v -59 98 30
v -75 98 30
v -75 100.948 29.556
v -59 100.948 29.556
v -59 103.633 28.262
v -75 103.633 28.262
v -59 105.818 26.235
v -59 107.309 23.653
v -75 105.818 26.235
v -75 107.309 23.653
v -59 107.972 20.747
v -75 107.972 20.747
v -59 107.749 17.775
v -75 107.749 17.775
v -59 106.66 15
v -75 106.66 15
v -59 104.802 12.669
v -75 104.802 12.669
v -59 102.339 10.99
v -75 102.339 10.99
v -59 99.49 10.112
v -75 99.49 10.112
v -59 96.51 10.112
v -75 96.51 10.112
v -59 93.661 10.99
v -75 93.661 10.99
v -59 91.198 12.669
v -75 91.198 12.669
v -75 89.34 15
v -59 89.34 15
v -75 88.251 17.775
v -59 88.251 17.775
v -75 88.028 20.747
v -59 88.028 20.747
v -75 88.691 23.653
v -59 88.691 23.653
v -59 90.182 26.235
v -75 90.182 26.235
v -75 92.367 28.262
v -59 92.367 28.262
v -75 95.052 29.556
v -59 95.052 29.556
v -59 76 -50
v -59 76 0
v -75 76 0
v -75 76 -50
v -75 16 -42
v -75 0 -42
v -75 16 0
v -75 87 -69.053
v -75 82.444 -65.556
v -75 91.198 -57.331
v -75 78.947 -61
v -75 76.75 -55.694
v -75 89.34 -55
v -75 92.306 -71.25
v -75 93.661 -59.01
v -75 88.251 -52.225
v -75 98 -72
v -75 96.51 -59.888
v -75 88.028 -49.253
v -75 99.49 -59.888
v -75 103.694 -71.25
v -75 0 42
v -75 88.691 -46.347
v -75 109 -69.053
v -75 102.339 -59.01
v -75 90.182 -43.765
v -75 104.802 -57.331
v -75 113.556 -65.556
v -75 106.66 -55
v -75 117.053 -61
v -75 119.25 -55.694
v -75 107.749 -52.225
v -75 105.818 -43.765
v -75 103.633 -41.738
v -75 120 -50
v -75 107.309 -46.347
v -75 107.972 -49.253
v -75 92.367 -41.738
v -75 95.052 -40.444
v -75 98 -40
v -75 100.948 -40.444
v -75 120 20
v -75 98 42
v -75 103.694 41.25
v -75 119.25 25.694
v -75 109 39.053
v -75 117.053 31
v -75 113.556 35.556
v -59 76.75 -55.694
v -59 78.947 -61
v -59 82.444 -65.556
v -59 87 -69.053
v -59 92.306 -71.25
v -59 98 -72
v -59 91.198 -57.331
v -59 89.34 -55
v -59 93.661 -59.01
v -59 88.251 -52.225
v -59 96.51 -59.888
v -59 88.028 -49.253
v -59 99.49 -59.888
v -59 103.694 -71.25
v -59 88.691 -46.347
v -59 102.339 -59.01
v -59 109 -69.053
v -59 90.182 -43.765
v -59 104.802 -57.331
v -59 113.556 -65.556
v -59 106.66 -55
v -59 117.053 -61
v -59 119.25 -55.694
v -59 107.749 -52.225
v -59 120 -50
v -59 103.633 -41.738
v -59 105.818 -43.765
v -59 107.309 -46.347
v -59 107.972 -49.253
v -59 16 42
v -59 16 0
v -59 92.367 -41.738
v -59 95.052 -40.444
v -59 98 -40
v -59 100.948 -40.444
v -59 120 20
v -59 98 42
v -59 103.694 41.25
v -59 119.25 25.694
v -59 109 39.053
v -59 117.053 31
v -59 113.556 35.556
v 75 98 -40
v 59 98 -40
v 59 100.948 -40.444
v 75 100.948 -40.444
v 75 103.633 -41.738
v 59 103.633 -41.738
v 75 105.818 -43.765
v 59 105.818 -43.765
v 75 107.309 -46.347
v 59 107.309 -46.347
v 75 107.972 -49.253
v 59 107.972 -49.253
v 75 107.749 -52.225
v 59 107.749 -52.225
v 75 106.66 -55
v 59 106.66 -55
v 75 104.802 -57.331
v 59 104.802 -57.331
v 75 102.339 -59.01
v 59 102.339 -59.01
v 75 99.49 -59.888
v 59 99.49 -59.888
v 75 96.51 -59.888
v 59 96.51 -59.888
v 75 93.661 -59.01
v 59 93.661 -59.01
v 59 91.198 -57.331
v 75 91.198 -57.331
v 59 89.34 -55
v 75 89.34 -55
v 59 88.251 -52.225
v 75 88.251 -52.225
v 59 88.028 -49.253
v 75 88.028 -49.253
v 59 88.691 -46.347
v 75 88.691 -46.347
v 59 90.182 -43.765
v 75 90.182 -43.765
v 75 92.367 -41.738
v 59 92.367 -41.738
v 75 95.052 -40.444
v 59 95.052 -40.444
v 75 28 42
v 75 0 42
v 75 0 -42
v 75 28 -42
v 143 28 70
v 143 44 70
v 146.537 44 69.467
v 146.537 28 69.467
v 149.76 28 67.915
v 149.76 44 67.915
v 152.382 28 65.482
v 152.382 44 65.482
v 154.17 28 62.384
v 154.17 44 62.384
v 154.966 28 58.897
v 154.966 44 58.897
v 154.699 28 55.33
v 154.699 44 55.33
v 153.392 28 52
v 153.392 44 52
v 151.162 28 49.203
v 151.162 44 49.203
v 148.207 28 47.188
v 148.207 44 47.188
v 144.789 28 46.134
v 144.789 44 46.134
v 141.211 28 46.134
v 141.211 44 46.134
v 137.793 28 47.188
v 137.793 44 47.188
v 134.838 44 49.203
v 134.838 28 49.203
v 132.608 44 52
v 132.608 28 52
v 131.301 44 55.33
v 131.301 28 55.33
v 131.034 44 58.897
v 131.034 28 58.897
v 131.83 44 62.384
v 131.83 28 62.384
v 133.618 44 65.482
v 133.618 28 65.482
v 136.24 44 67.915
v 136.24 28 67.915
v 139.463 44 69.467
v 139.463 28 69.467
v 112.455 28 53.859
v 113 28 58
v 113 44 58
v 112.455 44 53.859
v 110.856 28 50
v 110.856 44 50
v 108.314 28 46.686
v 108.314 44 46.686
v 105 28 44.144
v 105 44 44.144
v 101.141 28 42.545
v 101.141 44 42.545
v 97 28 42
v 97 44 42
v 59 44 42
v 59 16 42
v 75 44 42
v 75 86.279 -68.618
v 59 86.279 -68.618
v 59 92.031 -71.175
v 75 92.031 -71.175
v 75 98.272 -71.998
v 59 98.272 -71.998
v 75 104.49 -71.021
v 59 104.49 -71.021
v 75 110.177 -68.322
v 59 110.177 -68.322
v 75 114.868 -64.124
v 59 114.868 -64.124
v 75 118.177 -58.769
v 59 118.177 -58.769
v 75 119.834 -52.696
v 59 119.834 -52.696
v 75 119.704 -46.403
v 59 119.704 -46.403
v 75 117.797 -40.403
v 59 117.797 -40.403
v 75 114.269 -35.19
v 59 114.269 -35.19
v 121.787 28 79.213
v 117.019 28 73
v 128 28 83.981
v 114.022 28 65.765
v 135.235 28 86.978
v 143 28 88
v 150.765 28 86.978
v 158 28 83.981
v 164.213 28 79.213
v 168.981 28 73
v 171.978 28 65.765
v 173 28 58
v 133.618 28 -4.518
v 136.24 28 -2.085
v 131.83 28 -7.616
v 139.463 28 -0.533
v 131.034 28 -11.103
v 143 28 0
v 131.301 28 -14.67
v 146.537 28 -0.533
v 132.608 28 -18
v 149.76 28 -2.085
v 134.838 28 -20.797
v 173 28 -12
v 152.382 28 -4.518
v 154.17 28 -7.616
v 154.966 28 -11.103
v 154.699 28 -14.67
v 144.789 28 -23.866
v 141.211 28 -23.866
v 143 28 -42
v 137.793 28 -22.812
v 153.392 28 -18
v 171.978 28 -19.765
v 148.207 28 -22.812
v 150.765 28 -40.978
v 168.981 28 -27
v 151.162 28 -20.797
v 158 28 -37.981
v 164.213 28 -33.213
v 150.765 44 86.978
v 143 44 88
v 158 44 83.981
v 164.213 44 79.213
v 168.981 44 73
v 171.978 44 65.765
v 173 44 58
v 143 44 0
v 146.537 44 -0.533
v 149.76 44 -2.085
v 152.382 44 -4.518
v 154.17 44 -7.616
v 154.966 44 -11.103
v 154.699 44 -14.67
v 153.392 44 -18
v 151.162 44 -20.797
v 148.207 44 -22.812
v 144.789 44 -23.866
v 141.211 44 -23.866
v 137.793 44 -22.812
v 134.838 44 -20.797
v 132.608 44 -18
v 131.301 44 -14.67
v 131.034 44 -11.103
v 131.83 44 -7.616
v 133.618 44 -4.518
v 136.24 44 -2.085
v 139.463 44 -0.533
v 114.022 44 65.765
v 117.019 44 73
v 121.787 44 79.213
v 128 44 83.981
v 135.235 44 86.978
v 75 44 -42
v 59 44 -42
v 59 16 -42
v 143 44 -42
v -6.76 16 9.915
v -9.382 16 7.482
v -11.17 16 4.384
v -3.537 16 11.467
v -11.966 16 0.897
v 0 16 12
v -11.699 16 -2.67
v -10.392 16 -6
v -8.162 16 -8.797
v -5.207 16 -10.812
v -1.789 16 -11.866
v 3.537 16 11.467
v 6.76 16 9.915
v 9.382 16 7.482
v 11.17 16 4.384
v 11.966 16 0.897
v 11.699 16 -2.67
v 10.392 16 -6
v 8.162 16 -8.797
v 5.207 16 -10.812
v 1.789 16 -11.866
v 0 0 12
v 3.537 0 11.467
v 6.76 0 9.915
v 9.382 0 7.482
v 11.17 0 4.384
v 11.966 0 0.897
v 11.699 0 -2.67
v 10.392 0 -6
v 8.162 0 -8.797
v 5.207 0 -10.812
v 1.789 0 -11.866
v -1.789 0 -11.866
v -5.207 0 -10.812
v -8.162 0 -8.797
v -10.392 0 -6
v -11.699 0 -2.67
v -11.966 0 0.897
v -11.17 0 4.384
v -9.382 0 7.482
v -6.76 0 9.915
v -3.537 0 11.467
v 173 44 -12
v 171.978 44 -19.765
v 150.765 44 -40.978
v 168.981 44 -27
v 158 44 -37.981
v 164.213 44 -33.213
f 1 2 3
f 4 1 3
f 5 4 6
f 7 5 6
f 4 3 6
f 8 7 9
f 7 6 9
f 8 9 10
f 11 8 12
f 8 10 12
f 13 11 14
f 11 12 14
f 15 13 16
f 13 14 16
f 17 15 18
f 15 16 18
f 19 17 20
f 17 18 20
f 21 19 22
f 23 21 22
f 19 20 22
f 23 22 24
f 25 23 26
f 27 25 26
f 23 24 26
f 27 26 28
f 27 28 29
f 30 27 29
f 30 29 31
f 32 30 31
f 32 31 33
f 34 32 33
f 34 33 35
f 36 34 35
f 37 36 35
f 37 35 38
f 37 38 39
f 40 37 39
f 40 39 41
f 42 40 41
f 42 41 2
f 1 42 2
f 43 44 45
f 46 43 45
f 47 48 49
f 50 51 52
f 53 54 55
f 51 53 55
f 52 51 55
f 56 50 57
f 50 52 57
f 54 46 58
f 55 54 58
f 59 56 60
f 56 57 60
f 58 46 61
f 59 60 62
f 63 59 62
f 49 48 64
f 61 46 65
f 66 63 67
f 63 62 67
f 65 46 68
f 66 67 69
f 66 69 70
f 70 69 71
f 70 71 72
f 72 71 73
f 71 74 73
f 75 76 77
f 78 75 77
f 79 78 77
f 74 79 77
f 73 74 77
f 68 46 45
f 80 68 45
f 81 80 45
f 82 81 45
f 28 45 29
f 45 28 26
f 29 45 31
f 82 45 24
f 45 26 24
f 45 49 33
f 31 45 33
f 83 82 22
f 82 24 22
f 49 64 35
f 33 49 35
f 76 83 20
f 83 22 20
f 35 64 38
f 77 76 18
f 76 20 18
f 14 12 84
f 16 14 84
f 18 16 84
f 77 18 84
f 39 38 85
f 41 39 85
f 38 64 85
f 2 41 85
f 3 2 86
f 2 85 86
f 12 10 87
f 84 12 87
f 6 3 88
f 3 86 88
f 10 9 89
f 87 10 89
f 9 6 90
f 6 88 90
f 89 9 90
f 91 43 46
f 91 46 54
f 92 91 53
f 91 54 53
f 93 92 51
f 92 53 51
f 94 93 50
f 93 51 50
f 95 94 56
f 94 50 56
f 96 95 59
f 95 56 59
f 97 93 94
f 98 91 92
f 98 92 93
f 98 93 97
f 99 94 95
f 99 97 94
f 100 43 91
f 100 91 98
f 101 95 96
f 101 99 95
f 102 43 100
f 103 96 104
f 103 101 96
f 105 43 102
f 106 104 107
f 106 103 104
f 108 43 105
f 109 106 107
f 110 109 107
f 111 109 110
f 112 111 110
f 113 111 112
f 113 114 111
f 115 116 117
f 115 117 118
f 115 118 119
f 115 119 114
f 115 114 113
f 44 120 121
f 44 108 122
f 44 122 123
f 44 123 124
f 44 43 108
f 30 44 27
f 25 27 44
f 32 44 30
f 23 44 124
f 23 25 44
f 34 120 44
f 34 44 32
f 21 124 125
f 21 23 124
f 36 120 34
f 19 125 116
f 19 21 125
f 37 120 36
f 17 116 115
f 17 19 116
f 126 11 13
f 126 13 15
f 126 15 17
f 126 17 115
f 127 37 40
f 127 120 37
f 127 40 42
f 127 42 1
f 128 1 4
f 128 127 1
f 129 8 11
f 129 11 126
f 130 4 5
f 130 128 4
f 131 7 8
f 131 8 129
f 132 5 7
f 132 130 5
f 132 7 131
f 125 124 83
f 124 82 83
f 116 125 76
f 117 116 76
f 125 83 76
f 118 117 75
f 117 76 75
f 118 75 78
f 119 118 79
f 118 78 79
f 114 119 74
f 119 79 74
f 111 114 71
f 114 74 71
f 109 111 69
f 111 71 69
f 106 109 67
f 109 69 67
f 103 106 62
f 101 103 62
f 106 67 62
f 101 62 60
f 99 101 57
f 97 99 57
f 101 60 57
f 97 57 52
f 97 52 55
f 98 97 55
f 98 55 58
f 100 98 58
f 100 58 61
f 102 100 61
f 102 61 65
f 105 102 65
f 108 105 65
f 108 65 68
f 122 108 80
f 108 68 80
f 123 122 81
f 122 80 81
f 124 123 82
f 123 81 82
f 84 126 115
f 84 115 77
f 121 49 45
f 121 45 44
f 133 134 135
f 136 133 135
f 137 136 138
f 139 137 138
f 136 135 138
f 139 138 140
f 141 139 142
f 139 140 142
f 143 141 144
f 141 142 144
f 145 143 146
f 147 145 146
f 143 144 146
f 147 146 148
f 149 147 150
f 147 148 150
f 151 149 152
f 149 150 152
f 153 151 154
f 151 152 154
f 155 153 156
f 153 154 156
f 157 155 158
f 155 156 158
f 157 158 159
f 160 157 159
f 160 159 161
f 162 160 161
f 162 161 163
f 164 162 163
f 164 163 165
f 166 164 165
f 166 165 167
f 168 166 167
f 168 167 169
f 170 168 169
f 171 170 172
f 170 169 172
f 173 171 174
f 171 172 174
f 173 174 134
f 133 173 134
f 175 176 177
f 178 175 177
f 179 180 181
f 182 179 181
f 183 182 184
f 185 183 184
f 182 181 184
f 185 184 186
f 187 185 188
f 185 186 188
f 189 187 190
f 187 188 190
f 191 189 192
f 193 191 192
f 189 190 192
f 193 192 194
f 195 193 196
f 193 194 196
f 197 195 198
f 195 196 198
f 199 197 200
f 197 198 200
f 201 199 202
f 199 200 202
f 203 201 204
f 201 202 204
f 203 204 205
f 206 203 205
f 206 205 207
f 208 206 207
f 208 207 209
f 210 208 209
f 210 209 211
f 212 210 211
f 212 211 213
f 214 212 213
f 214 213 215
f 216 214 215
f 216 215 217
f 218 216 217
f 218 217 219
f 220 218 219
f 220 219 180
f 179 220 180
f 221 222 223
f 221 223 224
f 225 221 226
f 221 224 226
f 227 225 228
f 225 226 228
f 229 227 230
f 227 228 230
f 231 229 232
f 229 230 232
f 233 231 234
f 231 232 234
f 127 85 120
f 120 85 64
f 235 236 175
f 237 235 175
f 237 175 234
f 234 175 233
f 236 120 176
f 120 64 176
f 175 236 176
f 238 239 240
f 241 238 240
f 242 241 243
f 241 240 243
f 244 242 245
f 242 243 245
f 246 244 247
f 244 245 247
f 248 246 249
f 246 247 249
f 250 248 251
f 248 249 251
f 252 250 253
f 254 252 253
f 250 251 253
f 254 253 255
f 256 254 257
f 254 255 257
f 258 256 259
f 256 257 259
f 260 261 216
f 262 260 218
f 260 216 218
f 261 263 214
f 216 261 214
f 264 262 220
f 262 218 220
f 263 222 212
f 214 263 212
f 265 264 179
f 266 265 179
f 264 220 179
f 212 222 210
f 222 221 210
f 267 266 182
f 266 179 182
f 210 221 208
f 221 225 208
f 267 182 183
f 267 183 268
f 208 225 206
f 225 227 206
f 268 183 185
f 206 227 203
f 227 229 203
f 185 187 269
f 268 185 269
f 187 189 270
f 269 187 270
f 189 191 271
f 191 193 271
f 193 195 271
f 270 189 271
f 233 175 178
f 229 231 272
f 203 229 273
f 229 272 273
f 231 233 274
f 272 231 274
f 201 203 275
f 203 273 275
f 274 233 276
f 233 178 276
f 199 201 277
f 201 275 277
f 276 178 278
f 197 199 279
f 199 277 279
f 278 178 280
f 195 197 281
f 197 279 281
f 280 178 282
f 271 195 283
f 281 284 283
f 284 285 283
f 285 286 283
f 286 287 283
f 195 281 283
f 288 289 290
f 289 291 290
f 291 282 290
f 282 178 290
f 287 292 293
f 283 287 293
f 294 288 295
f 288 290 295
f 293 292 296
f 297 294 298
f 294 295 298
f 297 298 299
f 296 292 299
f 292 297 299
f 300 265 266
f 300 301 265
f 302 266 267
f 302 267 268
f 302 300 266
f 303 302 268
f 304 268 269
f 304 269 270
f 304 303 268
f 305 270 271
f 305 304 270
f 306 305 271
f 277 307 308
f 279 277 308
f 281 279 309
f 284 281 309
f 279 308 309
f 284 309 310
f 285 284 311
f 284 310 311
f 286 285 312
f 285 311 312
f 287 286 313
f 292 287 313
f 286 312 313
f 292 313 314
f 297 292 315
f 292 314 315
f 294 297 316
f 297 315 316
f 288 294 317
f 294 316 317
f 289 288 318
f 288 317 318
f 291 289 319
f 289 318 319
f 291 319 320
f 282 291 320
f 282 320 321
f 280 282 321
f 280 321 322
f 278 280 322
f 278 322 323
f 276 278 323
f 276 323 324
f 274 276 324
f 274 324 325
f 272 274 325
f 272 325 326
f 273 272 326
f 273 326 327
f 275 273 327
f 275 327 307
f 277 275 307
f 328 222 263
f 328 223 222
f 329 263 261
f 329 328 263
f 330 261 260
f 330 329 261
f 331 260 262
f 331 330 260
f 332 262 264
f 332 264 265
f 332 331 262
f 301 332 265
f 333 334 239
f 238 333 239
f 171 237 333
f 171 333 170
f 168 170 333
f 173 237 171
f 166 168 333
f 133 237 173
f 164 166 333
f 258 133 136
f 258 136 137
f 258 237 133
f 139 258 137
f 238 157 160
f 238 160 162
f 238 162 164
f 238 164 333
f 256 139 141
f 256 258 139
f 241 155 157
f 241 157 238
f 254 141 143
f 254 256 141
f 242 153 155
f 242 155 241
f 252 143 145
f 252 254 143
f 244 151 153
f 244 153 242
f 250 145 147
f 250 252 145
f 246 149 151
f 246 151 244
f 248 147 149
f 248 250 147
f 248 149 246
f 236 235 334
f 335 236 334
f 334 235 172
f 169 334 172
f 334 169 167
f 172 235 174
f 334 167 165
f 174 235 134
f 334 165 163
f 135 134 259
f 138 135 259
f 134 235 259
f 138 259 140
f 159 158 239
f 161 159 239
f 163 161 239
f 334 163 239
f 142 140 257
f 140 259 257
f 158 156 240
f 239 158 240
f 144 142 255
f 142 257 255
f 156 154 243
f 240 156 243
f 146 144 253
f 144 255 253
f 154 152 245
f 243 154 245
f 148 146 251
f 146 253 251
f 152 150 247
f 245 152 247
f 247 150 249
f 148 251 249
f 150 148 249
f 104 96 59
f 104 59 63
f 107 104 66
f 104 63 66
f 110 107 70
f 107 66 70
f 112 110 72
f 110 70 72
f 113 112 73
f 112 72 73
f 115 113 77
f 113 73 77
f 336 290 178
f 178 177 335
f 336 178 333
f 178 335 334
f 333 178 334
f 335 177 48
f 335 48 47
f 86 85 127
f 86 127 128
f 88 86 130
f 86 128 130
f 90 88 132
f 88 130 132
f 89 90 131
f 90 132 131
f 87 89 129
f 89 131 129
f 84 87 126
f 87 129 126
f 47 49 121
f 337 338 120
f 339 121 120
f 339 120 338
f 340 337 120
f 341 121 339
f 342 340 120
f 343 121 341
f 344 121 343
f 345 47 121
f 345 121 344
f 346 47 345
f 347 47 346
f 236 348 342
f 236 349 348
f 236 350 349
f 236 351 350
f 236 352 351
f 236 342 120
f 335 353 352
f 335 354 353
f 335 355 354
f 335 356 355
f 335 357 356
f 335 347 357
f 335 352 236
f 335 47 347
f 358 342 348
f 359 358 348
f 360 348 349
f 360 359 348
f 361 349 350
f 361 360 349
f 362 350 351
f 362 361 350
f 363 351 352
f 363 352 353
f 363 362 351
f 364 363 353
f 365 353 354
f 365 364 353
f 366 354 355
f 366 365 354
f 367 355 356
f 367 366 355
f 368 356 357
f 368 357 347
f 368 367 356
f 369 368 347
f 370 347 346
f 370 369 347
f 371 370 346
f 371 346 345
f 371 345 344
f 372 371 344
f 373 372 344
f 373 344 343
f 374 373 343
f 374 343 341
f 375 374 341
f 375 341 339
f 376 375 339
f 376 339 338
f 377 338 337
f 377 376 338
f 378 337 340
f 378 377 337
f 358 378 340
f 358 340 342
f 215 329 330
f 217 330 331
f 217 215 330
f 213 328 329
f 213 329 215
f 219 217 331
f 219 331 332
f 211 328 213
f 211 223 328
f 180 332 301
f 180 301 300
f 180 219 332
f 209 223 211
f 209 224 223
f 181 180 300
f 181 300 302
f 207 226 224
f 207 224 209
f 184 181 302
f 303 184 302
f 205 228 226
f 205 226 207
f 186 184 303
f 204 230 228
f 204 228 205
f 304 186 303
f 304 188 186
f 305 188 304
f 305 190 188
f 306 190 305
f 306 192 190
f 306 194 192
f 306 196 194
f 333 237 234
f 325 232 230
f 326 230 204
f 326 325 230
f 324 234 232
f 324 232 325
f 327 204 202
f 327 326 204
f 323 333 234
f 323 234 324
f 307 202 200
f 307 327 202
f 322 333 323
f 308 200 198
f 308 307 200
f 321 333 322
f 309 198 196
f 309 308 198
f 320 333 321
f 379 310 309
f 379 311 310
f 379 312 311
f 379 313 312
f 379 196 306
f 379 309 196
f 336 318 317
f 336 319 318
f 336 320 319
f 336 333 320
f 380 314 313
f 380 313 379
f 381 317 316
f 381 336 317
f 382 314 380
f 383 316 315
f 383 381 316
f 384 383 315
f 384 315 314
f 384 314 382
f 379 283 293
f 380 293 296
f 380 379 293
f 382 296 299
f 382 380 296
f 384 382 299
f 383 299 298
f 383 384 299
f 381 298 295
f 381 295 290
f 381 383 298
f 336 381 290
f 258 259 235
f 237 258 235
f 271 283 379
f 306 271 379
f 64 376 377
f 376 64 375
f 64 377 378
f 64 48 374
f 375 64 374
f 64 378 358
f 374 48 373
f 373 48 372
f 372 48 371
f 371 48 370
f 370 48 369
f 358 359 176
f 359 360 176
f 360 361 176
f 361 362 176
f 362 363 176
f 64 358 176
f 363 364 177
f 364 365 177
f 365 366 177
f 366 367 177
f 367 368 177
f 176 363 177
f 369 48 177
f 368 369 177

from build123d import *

# Parameters (mm, degrees)
SKETCH1_W           = 150
SKETCH1_H           = 84
SKETCH1_R           = 12
BOSS_EXTRUDE1_DEPTH = 16
SKETCH4_W           = 16
SKETCH4_H           = 84
BOSS_EXTRUDE2_DEPTH = 28
SKETCH5_W           = 84
SKETCH5_H           = 16
BOSS_EXTRUDE3_DEPTH = 98
SKETCH7_W           = 60
SKETCH7_H           = 16
BOSS_EXTRUDE4_DEPTH = 46
FILLET2_R           = 30
FILLET3_R           = 16
CUT_EXTRUDE1_REACH  = 201.02
SKETCH9_R           = 12
SKETCH11_R          = 10
BOSS_EXTRUDE5_DEPTH = 16
SKETCH13_W          = 16
SKETCH13_H          = 42
BOSS_EXTRUDE6_DEPTH = 104
FILLET4_R           = 22
CUT_EXTRUDE2_REACH  = 291.22
SKETCH15_R          = 10
SKETCH14_W          = 16
SKETCH14_H          = 44
BOSS_EXTRUDE8_DEPTH = 72
CUT_EXTRUDE3_REACH  = 291.22
SKETCH16_R          = 10
FILLET5_R           = 22


with BuildPart() as part:
    # Sketch1 → Boss-Extrude1 (new body)
    with BuildSketch(Plane(origin=(0, 0, 0), x_dir=(1, 0, 0), z_dir=(0, 1, 0))):
        Rectangle(SKETCH1_W, SKETCH1_H)
        with Locations(Location((0, 0, 0), (0, 0, 270))):
            Circle(SKETCH1_R, mode=Mode.SUBTRACT)
    extrude(amount=BOSS_EXTRUDE1_DEPTH)

    # Sketch4 → Boss-Extrude2 (add)
    with BuildSketch(Plane(origin=(0, 16, 0), x_dir=(1, 0, 0), z_dir=(0, 1, 0))):
        with Locations((67, 0)):
            Rectangle(SKETCH4_W, SKETCH4_H)
    extrude(amount=BOSS_EXTRUDE2_DEPTH)

    # Sketch5 → Boss-Extrude3 (add)
    with BuildSketch(Plane(origin=(75, 0, 0), x_dir=(0, 0, -1), z_dir=(1, 0, 0))):
        with Locations((0, 36)):
            Rectangle(SKETCH5_W, SKETCH5_H)
    extrude(amount=BOSS_EXTRUDE3_DEPTH)

    # Sketch7 → Boss-Extrude4 (add)
    with BuildSketch(Plane.XY.offset(42)):
        with Locations((143, 36)):
            Rectangle(SKETCH7_W, SKETCH7_H)
    extrude(amount=BOSS_EXTRUDE4_DEPTH)

    # Fillet2
    fillet2_edges = [part.edges().sort_by_distance(p)[0] for p in [
        (173, 36, 88),
        (173, 36, -42),
        (113, 36, 88),
    ]]
    fillet(fillet2_edges, radius=FILLET2_R - 0.0001)  # a hair under: the kernel refuses the full size

    # Fillet3
    fillet3_edges = [part.edges().sort_by_distance(p)[0] for p in [
        (113, 36, 42),
    ]]
    fillet(fillet3_edges, radius=FILLET3_R)

    # Sketch9 → Cut-Extrude1 (cut, up to next)
    with BuildSketch(Plane(origin=(0, 44, 0), x_dir=(1, 0, 0), z_dir=(0, 1, 0)), mode=Mode.PRIVATE) as cut_extrude1_sk1:
        with Locations(Location((143, 12, 0), (0, 0, 270))):
            Circle(SKETCH9_R)
    cut_extrude1_tool1 = extrude(cut_extrude1_sk1.sketch, amount=-CUT_EXTRUDE1_REACH, mode=Mode.PRIVATE) & part.part
    # Sketch9 → Cut-Extrude1 (cut, up to next)
    with BuildSketch(Plane(origin=(0, 44, 0), x_dir=(1, 0, 0), z_dir=(0, 1, 0)), mode=Mode.PRIVATE) as cut_extrude1_sk2:
        with Locations(Location((143, -58, 0), (0, 0, 270))):
            Circle(SKETCH9_R)
    cut_extrude1_tool2 = extrude(cut_extrude1_sk2.sketch, amount=-CUT_EXTRUDE1_REACH, mode=Mode.PRIVATE) & part.part
    add(cut_extrude1_tool1.solids().sort_by_distance((143, 44, -12))[0], mode=Mode.SUBTRACT)
    add(cut_extrude1_tool2.solids().sort_by_distance((143, 44, 58))[0], mode=Mode.SUBTRACT)

    # Sketch11 → Boss-Extrude5 (add)
    with BuildSketch(Plane.ZY.offset(-59)):
        with BuildLine():
            Line((-42, 44), (-68.617604355, 86.278873429))
            ThreePointArc((-68.617604355, 86.278873429), (-64.123788111, 114.867679431), (-35.190151029, 114.268631579))
            Line((-35.190151029, 114.268631579), (42, 44))
            Line((42, 44), (-42, 44))
        make_face()
        with Locations((-50, 98)):
            Circle(SKETCH11_R, mode=Mode.SUBTRACT)
    extrude(amount=-BOSS_EXTRUDE5_DEPTH)

    # Sketch13 → Boss-Extrude6 (add)
    with BuildSketch(Plane(origin=(0, 16, 0), x_dir=(1, 0, 0), z_dir=(0, 1, 0))):
        with Locations((-67, -21)):
            Rectangle(SKETCH13_W, SKETCH13_H)
    extrude(amount=BOSS_EXTRUDE6_DEPTH)

    # Fillet4
    fillet4_edges = [part.edges().sort_by_distance(p)[0] for p in [
        (-67, 120, 42),
    ]]
    fillet(fillet4_edges, radius=FILLET4_R)

    # Sketch15 → Cut-Extrude2 (cut, up to next)
    with BuildSketch(Plane.ZY.offset(75), mode=Mode.PRIVATE) as cut_extrude2_sk1:
        with Locations((20, 98)):
            Circle(SKETCH15_R)
    cut_extrude2_tool1 = extrude(cut_extrude2_sk1.sketch, amount=-CUT_EXTRUDE2_REACH, mode=Mode.PRIVATE) & part.part
    add(cut_extrude2_tool1.solids().sort_by_distance((-75, 98, 20))[0], mode=Mode.SUBTRACT)

    # Sketch14 → Boss-Extrude8 (add)
    with BuildSketch(Plane(origin=(0, 0, 0), x_dir=(-1, 0, 0), z_dir=(0, 0, -1))):
        with Locations((67, 98)):
            Rectangle(SKETCH14_W, SKETCH14_H)
    extrude(amount=BOSS_EXTRUDE8_DEPTH)

    # Sketch16 → Cut-Extrude3 (cut, up to next)
    with BuildSketch(Plane.ZY.offset(75), mode=Mode.PRIVATE) as cut_extrude3_sk1:
        with Locations((-50, 98)):
            Circle(SKETCH16_R)
    cut_extrude3_tool1 = extrude(cut_extrude3_sk1.sketch, amount=-CUT_EXTRUDE3_REACH, mode=Mode.PRIVATE) & part.part
    add(cut_extrude3_tool1.solids().sort_by_distance((-75, 98, -50))[0], mode=Mode.SUBTRACT)

    # Fillet5
    fillet5_edges = [part.edges().sort_by_distance(p)[0] for p in [
        (-67, 120, -72),
        (-67, 76, -72),
    ]]
    fillet(fillet5_edges, radius=FILLET5_R - 0.0001)  # a hair under: the kernel refuses the full size


solid = part.part
